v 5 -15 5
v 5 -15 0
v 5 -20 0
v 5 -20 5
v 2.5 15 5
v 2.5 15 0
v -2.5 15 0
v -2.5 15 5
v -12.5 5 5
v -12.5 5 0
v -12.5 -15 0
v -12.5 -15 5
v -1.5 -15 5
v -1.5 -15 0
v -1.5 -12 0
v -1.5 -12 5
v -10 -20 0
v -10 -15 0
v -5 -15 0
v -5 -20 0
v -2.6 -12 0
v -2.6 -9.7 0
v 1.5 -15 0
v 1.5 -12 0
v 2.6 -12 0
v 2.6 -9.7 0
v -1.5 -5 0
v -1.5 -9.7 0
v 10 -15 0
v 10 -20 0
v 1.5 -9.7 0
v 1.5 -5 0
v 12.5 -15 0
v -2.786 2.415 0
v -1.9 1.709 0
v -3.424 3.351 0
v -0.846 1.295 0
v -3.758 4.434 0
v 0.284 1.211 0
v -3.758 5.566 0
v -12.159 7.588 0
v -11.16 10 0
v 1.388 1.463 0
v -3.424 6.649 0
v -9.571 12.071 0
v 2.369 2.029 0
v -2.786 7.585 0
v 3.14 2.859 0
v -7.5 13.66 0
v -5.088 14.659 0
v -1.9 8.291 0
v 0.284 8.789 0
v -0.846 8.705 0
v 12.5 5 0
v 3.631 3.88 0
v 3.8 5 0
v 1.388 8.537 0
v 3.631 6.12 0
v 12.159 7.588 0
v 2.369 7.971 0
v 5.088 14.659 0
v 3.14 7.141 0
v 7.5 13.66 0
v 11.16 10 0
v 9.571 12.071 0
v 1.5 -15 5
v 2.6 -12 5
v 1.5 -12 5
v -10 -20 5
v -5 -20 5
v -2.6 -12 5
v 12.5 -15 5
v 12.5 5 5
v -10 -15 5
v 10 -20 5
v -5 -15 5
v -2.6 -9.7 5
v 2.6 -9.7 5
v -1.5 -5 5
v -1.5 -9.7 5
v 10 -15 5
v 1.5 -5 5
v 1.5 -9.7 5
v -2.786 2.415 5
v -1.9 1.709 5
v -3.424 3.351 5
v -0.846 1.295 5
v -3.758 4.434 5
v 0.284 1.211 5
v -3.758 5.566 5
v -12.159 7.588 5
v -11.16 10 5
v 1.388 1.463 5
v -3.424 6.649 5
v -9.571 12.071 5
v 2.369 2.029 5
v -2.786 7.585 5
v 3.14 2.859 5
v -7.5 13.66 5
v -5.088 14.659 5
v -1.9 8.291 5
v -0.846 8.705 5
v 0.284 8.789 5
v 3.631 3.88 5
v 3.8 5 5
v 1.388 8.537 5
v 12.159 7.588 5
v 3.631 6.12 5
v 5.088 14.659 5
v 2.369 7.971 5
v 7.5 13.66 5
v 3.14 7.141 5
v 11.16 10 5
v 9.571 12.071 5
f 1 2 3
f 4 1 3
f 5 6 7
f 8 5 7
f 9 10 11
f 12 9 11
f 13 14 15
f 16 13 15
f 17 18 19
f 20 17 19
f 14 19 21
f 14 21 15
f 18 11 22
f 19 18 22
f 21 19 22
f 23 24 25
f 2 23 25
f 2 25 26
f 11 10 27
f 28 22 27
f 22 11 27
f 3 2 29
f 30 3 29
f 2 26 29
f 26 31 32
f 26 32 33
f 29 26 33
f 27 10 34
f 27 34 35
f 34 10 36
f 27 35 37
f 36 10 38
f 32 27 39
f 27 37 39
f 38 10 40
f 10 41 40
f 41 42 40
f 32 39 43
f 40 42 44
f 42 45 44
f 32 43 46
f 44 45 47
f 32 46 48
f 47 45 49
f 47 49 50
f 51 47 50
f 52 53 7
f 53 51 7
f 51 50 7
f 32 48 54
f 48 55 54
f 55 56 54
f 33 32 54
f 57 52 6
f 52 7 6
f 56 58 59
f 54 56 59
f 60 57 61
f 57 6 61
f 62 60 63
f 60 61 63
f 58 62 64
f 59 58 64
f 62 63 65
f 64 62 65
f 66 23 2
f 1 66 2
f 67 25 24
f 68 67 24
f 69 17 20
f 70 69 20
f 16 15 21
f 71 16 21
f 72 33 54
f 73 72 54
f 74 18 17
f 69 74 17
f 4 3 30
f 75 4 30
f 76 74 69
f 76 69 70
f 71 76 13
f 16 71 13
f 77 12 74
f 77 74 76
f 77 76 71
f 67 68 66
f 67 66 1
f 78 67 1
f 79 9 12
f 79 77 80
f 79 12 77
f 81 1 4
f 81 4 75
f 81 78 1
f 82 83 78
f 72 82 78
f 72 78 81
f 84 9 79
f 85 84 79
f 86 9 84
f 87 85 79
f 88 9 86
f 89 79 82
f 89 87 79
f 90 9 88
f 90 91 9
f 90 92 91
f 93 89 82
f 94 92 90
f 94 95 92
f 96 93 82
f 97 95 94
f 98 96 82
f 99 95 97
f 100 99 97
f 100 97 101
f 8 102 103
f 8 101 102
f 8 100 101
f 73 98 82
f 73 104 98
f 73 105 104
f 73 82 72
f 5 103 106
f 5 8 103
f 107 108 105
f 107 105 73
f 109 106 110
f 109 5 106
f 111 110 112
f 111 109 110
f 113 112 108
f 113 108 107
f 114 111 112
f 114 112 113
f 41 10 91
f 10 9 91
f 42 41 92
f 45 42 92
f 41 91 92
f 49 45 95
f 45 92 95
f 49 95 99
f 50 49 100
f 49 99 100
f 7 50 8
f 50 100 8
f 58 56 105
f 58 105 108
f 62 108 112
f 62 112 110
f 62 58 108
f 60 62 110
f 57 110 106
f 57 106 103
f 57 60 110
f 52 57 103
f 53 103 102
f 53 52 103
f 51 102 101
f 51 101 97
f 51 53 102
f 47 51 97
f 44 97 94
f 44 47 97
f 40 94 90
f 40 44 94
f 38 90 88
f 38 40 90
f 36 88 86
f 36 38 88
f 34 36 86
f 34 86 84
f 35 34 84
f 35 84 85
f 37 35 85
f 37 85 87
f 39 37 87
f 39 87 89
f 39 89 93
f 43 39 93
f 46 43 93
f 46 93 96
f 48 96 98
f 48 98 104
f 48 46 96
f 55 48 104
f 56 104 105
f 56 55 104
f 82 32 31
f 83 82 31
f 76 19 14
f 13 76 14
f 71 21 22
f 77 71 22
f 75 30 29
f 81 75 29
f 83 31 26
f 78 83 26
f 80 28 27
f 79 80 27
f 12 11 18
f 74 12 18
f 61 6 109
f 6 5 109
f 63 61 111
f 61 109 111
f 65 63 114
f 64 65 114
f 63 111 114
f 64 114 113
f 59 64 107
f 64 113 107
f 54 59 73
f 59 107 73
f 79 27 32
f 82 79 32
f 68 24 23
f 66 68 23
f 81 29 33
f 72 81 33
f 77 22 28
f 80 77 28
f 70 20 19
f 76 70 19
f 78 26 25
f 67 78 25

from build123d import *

# Parameters (mm, degrees)
SKETCH1_R           = 3.8
BOSS_EXTRUDE1_DEPTH = 5
FILLET1_R           = 10


with BuildPart() as part:
    # Sketch1 → Boss-Extrude1 (new body)
    with BuildSketch(Plane.XY):
        Polygon((-12.5, 15), (-12.5, -15), (-10, -15), (-10, -20), (-5, -20), (-5, -15), (-1.5, -15), (-1.5, -12), (-2.6, -12), (-2.6, -9.7), (-1.5, -9.7), (-1.5, -5), (1.5, -5), (1.5, -9.7), (2.6, -9.7), (2.6, -12), (1.5, -12), (1.5, -15), (5, -15), (5, -20), (10, -20), (10, -15), (12.5, -15), (12.5, 15), align=None)
        with Locations((0, 5)):
            Circle(SKETCH1_R, mode=Mode.SUBTRACT)
    extrude(amount=BOSS_EXTRUDE1_DEPTH)

    # Fillet1
    fillet1_edges = [part.edges().sort_by_distance(p)[0] for p in [
        (-12.5, 15, 2.5),
        (12.5, 15, 2.5),
    ]]
    fillet(fillet1_edges, radius=FILLET1_R)


solid = part.part
